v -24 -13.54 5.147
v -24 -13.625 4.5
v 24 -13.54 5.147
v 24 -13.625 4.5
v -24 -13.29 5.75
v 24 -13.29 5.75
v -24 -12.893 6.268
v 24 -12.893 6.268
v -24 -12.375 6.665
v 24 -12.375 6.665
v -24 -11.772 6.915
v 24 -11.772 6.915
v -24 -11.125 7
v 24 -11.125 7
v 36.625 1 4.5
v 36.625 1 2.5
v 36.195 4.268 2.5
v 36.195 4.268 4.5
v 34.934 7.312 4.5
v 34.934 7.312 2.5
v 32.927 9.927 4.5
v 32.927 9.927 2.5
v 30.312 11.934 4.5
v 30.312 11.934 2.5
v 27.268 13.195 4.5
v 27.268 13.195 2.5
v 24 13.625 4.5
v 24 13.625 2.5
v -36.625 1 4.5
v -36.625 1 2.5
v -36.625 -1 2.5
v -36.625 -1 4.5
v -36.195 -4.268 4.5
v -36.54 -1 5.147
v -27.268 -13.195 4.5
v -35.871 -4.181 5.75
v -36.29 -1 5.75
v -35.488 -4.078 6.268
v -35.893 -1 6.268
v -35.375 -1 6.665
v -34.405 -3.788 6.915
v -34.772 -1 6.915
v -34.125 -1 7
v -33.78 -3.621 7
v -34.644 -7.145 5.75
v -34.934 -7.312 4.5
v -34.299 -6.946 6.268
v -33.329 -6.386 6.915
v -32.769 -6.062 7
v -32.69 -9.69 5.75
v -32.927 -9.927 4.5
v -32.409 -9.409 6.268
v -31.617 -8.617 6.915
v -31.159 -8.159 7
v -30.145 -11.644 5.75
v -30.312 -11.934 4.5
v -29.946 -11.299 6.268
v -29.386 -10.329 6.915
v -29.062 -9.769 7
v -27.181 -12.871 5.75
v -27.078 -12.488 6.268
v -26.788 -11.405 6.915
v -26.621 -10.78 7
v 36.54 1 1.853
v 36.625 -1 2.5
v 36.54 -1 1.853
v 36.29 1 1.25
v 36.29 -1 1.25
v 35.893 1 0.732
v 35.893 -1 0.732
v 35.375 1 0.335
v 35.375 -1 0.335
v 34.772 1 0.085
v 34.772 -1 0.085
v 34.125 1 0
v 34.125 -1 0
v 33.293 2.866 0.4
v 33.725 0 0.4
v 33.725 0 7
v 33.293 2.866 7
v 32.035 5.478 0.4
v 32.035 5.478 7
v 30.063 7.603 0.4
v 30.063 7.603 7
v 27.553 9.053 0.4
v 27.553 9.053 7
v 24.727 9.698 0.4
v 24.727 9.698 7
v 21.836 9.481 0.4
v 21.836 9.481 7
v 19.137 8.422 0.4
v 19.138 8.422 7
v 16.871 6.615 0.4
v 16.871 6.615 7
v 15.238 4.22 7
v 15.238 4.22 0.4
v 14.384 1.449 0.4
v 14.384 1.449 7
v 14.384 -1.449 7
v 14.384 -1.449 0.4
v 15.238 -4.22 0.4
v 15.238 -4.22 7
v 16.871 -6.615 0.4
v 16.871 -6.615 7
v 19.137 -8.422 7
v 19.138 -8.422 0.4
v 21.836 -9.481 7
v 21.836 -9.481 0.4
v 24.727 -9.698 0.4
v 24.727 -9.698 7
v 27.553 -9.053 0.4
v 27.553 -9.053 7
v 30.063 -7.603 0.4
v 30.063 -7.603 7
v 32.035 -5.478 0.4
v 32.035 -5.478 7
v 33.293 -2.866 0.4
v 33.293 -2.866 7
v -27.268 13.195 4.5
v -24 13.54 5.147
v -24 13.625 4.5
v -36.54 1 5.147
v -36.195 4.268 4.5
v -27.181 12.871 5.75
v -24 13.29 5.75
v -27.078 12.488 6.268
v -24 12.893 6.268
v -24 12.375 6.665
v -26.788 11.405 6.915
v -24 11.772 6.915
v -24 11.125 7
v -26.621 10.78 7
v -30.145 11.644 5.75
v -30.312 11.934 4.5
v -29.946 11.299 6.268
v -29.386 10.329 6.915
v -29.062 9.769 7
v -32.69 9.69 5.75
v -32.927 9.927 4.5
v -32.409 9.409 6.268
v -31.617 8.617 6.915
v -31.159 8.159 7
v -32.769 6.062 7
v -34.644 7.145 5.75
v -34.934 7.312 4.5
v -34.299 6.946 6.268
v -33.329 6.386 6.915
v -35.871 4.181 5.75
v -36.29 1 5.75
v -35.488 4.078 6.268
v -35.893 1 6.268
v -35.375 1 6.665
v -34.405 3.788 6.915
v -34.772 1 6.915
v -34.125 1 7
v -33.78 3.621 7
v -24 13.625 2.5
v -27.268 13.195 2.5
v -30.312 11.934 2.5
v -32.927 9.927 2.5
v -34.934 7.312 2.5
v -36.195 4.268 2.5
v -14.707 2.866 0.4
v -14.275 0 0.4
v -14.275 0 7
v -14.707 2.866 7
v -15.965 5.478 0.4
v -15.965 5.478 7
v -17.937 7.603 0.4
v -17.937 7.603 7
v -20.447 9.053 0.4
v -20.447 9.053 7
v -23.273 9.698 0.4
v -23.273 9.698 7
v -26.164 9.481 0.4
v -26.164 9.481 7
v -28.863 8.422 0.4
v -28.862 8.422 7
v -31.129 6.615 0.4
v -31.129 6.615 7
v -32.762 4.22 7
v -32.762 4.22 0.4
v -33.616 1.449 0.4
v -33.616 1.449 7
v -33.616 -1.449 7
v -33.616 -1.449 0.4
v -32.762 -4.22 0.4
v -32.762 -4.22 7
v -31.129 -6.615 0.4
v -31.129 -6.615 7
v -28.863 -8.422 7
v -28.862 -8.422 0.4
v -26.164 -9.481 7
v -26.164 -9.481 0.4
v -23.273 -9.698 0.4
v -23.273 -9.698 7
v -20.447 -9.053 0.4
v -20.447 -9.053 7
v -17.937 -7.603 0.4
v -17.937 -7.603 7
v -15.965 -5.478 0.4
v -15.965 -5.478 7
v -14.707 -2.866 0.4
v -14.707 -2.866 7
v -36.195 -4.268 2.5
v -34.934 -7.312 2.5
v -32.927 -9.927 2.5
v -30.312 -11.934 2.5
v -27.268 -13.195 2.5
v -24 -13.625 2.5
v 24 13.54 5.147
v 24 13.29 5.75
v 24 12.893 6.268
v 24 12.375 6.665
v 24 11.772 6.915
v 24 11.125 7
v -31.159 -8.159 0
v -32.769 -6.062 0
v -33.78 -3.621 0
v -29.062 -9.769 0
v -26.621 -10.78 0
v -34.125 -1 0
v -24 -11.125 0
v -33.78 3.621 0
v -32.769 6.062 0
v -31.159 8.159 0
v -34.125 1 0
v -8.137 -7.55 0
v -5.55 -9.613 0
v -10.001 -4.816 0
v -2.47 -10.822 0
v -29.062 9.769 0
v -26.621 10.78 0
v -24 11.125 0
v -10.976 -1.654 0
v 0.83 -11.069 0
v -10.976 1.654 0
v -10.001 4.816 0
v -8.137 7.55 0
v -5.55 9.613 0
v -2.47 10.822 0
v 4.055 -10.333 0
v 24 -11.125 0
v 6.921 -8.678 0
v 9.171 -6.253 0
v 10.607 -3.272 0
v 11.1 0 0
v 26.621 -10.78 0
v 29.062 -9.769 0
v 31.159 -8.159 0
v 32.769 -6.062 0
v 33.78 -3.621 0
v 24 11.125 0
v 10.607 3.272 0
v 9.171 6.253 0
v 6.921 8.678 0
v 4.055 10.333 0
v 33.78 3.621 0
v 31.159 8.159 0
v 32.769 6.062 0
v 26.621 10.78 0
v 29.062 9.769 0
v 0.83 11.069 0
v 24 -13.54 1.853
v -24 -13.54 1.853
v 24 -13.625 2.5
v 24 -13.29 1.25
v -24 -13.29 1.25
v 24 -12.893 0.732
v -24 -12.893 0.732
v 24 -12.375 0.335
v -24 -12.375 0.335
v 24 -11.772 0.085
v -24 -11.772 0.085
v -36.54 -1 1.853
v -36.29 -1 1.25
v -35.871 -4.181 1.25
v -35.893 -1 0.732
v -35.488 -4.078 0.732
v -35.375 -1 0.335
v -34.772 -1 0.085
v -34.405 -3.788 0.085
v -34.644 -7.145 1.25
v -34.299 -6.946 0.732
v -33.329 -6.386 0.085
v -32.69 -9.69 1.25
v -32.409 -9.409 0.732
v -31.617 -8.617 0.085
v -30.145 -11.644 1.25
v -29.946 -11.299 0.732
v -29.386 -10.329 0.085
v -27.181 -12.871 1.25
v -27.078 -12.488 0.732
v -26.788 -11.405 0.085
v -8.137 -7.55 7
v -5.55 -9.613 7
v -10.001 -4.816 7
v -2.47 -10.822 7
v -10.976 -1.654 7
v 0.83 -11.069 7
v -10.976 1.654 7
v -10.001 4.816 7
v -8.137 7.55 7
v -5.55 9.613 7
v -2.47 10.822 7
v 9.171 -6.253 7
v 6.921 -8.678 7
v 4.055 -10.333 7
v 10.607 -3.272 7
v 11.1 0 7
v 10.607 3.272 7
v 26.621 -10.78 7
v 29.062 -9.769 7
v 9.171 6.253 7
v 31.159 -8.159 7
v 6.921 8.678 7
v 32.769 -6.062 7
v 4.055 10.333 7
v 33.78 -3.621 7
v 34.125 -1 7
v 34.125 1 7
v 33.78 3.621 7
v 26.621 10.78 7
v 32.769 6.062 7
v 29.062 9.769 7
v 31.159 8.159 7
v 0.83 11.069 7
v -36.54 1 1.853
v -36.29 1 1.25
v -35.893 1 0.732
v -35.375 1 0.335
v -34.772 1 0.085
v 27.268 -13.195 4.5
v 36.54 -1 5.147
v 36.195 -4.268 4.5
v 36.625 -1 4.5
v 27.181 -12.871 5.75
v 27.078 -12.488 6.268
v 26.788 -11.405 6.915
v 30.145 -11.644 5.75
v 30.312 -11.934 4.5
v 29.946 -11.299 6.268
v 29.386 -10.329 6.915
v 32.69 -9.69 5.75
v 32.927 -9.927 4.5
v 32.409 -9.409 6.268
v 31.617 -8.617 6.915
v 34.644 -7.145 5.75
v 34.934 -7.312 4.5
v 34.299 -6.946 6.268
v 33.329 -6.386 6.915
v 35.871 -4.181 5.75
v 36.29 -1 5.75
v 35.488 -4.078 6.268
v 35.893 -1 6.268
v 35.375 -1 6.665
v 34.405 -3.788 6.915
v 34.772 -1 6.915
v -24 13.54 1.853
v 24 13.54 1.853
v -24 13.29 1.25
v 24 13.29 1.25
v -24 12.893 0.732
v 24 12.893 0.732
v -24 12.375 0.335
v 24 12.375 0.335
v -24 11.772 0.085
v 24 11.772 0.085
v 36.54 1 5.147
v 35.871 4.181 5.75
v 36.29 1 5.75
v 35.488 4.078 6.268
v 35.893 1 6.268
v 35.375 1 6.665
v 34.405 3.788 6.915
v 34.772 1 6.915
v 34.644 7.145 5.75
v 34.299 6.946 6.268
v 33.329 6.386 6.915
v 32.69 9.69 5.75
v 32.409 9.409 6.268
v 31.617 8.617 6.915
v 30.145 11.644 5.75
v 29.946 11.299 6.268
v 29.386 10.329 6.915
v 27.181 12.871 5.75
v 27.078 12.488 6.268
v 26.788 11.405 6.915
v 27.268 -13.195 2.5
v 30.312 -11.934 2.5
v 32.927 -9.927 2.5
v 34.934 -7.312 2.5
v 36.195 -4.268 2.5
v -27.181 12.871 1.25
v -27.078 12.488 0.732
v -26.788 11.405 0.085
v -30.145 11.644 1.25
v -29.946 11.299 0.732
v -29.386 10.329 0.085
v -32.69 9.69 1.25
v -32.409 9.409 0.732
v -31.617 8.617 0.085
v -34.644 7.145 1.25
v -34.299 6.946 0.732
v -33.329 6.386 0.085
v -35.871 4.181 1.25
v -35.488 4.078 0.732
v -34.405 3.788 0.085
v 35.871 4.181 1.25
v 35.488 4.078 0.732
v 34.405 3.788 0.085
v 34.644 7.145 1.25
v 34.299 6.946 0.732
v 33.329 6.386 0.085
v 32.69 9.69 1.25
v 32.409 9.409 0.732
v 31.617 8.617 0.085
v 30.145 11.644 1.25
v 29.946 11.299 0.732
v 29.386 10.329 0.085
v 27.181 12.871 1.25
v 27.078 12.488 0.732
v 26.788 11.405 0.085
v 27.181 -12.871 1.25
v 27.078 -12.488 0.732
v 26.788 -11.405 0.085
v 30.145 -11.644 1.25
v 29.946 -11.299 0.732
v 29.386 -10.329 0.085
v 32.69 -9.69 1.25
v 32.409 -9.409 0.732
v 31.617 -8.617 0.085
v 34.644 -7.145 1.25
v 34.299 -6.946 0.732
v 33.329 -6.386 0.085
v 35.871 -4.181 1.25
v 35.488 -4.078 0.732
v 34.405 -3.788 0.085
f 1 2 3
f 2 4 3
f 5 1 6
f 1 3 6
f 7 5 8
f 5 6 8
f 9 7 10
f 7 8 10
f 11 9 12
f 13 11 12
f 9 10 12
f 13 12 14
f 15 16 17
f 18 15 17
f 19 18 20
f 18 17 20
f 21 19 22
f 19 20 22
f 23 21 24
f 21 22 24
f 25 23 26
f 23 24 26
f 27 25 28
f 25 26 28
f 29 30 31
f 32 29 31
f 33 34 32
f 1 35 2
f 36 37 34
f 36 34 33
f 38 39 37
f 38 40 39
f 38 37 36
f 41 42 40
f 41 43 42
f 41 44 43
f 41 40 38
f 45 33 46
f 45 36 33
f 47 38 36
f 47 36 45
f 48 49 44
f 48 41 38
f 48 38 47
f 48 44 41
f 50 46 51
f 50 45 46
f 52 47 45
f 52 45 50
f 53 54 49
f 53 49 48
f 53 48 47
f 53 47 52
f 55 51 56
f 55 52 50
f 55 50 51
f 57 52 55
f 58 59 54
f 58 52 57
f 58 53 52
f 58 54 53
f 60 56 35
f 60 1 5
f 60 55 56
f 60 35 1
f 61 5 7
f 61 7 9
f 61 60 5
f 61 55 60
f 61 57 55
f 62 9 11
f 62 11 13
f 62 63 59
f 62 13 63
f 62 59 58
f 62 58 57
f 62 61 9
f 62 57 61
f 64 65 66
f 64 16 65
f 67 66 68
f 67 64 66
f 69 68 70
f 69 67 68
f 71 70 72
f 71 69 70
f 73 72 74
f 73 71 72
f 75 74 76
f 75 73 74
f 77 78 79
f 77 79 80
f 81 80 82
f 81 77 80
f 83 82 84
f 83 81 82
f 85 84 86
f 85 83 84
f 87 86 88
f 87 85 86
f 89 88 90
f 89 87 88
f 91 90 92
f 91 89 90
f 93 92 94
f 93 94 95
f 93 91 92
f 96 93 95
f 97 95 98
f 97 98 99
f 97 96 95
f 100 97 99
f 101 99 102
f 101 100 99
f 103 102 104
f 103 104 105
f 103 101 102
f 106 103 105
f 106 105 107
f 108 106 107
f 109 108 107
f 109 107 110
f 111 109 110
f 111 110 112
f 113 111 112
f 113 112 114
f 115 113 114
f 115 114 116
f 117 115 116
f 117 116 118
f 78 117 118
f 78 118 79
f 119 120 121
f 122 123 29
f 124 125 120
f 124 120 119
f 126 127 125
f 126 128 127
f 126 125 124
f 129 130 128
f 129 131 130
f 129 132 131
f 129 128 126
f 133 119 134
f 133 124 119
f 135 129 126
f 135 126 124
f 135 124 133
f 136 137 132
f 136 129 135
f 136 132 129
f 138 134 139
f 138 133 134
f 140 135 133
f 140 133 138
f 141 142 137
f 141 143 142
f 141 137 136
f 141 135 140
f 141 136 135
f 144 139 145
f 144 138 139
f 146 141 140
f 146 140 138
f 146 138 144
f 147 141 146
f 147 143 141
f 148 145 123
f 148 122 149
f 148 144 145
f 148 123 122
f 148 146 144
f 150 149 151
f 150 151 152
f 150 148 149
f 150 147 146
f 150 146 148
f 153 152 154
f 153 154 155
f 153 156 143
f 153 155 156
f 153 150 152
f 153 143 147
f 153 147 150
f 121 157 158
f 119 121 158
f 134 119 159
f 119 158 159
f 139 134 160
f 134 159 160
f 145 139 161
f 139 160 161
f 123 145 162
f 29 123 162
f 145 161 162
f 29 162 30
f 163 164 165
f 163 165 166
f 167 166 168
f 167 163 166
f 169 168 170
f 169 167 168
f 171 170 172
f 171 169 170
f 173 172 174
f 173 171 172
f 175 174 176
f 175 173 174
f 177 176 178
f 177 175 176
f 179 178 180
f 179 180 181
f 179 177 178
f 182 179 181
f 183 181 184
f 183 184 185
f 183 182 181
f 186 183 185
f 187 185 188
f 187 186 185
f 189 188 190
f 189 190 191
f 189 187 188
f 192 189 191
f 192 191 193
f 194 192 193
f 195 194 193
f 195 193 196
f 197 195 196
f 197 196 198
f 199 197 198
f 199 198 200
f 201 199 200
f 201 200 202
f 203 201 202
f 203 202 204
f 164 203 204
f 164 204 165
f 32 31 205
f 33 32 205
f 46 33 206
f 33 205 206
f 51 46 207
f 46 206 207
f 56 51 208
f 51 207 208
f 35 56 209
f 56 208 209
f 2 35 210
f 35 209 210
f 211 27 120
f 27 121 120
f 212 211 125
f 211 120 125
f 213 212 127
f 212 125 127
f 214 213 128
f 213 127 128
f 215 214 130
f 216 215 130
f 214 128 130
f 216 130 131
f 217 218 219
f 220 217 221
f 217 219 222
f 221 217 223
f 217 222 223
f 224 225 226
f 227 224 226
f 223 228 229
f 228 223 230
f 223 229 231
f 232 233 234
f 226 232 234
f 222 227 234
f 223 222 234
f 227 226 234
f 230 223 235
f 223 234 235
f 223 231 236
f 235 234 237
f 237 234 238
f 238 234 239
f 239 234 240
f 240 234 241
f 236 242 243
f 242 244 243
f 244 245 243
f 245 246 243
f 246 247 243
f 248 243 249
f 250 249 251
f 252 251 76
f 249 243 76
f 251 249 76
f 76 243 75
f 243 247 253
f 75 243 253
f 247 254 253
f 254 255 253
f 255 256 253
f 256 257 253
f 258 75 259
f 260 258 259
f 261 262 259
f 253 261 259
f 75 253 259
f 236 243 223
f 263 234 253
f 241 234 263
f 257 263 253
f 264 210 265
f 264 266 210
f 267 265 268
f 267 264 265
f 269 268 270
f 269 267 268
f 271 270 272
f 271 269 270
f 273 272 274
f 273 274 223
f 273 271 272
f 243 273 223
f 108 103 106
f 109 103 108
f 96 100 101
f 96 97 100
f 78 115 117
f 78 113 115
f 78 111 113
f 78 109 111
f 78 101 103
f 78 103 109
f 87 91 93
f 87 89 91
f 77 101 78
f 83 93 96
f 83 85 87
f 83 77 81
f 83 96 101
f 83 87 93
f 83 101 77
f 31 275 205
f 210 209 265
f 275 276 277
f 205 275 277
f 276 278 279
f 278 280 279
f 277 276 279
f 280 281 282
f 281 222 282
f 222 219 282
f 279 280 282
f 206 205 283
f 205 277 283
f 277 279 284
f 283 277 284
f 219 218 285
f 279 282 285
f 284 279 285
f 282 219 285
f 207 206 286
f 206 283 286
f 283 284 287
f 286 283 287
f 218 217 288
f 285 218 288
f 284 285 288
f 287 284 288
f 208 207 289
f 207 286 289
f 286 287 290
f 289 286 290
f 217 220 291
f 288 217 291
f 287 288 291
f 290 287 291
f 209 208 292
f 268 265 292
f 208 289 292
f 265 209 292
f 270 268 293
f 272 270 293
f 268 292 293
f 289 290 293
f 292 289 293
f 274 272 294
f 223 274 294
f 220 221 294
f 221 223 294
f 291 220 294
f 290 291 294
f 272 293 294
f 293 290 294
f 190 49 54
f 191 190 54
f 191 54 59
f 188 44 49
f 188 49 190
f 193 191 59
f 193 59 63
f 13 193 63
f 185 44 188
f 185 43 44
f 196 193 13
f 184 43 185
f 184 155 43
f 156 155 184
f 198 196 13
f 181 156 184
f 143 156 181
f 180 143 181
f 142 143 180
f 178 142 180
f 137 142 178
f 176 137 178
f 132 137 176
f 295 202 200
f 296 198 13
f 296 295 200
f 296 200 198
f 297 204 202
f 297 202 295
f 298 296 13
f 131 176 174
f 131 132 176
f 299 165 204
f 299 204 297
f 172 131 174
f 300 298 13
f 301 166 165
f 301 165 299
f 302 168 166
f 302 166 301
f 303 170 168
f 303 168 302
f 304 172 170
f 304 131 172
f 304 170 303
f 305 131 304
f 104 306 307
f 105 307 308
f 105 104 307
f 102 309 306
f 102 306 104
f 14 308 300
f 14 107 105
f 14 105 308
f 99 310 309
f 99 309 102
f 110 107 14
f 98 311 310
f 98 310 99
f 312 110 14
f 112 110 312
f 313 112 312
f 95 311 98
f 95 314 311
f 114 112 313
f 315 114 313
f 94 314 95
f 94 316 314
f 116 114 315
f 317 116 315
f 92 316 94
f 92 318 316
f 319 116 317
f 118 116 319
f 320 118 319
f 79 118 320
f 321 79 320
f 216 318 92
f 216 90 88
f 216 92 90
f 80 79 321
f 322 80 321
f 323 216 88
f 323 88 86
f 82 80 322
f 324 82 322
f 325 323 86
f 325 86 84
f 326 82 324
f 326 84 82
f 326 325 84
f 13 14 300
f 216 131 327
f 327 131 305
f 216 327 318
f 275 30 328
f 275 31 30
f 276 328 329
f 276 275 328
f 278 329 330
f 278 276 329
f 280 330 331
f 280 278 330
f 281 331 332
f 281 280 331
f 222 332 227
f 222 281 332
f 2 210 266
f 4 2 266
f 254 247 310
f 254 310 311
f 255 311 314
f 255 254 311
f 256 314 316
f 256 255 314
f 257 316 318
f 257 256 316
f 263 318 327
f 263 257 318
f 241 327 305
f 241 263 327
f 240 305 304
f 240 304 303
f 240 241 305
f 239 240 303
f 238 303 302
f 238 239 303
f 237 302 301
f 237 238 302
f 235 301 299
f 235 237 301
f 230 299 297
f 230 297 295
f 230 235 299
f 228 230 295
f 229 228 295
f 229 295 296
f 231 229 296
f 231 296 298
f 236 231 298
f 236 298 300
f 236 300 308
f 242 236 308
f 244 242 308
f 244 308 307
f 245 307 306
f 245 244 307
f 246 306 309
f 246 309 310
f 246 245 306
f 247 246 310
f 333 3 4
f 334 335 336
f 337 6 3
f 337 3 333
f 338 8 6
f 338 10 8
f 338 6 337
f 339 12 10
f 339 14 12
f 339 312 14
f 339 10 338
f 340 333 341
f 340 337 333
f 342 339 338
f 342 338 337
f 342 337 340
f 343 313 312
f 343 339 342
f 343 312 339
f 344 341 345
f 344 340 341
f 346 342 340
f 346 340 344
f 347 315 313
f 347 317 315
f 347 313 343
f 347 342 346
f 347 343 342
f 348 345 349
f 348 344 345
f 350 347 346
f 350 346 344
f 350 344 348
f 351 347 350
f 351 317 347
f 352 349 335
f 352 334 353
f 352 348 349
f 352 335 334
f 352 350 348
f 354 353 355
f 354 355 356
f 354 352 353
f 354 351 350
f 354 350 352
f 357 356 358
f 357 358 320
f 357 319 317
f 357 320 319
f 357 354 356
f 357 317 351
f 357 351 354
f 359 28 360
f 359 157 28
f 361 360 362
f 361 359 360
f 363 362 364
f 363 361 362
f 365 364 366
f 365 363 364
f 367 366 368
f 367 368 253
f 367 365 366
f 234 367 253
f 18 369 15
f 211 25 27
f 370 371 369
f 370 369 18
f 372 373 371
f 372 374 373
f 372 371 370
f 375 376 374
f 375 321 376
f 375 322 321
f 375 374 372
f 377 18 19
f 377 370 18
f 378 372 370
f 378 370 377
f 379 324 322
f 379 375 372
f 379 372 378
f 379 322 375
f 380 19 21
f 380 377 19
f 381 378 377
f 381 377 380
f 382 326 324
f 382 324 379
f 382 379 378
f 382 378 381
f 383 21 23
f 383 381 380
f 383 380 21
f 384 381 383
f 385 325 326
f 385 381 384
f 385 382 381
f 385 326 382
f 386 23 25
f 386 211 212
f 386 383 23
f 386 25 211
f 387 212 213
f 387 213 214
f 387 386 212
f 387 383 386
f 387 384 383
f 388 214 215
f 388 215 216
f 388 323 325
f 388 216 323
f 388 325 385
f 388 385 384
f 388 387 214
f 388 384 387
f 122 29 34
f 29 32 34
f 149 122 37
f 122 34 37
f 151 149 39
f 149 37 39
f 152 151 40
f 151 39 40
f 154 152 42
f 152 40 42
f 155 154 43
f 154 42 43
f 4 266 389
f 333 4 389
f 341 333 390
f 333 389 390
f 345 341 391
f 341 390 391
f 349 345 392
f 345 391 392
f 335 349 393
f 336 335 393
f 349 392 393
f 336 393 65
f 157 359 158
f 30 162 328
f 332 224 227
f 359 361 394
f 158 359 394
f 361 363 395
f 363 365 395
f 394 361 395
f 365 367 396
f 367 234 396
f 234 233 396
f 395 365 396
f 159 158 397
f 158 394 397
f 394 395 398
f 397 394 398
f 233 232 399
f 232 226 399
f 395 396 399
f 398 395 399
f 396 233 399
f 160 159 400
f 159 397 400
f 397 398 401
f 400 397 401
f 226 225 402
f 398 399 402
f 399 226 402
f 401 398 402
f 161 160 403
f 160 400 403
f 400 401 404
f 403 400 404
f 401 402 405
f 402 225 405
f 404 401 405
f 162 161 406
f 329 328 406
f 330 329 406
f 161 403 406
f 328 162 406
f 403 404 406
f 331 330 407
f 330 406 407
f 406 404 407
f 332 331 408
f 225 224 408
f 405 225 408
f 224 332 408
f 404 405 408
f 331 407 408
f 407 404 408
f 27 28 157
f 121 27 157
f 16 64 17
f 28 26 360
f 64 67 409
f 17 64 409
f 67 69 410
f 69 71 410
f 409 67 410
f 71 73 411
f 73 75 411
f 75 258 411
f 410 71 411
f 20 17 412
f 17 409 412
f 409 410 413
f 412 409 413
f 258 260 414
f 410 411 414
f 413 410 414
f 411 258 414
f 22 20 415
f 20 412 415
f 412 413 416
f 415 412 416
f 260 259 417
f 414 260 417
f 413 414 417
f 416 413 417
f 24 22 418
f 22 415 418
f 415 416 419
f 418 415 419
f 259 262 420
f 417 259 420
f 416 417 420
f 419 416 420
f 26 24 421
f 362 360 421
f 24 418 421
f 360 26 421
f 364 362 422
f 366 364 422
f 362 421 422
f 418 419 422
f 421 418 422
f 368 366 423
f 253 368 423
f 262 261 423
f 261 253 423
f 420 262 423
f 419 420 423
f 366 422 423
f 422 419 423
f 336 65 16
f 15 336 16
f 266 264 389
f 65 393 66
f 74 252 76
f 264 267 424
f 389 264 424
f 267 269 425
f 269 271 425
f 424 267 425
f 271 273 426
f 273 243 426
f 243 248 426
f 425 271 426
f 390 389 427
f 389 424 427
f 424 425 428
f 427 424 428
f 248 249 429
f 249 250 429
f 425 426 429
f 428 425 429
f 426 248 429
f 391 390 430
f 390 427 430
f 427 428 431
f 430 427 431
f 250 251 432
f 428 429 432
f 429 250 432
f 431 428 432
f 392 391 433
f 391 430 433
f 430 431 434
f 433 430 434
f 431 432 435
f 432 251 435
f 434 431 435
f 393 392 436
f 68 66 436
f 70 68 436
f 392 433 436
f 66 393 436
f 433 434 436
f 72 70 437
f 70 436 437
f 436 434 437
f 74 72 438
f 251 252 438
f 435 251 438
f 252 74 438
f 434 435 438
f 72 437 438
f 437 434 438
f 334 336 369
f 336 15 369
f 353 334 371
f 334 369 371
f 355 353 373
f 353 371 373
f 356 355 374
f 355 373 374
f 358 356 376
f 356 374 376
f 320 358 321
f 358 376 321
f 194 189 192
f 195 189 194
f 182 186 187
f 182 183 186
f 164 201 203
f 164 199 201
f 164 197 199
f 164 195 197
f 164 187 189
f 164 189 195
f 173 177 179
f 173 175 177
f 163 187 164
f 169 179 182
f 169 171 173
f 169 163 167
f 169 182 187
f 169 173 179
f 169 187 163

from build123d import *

# Parameters (mm, degrees)
F0_R     = 9.725
F0_R_2   = 11.1
F1_DEPTH = 7
F2_R     = 2.5
F3_R     = 9.75
F4_DEPTH = 0.4


with BuildPart() as f1:
    # F0 (on Top) → F1 (new body)
    with BuildSketch(Plane.XY):
        with BuildLine():
            Line((24, 13.625), (-24, 13.625))
            ThreePointArc((-24, 13.625), (-32.927223, 9.927223), (-36.625, 1))
            Line((-36.625, 1), (-36.625, -1))
            ThreePointArc((-36.625, -1), (-32.927223, -9.927223), (-24, -13.625))
            Line((-24, -13.625), (24, -13.625))
            ThreePointArc((24, -13.625), (32.927223, -9.927223), (36.625, -1))
            Line((36.625, -1), (36.625, 1))
            ThreePointArc((36.625, 1), (32.927223, 9.927223), (24, 13.625))
        make_face()
        with Locations((-24, 0)):
            Circle(F0_R, mode=Mode.SUBTRACT)
        Circle(F0_R_2, mode=Mode.SUBTRACT)
        with Locations((24, 0)):
            Circle(F0_R, mode=Mode.SUBTRACT)
    extrude(amount=F1_DEPTH)

    # F2
    f2_edges = [f1.edges().sort_by_distance(p)[0] for p in [
        (0, -13.625, 7),
        (0, -13.625, 0),
    ]]
    fillet(f2_edges, radius=F2_R)

    # F3 (on Top) → F4 (join)
    with BuildSketch(Plane.XY):
        with Locations((-24, 0)):
            Circle(F3_R)
        with Locations((24, 0)):
            Circle(F3_R)
    extrude(amount=F4_DEPTH)


solid = f1.part
